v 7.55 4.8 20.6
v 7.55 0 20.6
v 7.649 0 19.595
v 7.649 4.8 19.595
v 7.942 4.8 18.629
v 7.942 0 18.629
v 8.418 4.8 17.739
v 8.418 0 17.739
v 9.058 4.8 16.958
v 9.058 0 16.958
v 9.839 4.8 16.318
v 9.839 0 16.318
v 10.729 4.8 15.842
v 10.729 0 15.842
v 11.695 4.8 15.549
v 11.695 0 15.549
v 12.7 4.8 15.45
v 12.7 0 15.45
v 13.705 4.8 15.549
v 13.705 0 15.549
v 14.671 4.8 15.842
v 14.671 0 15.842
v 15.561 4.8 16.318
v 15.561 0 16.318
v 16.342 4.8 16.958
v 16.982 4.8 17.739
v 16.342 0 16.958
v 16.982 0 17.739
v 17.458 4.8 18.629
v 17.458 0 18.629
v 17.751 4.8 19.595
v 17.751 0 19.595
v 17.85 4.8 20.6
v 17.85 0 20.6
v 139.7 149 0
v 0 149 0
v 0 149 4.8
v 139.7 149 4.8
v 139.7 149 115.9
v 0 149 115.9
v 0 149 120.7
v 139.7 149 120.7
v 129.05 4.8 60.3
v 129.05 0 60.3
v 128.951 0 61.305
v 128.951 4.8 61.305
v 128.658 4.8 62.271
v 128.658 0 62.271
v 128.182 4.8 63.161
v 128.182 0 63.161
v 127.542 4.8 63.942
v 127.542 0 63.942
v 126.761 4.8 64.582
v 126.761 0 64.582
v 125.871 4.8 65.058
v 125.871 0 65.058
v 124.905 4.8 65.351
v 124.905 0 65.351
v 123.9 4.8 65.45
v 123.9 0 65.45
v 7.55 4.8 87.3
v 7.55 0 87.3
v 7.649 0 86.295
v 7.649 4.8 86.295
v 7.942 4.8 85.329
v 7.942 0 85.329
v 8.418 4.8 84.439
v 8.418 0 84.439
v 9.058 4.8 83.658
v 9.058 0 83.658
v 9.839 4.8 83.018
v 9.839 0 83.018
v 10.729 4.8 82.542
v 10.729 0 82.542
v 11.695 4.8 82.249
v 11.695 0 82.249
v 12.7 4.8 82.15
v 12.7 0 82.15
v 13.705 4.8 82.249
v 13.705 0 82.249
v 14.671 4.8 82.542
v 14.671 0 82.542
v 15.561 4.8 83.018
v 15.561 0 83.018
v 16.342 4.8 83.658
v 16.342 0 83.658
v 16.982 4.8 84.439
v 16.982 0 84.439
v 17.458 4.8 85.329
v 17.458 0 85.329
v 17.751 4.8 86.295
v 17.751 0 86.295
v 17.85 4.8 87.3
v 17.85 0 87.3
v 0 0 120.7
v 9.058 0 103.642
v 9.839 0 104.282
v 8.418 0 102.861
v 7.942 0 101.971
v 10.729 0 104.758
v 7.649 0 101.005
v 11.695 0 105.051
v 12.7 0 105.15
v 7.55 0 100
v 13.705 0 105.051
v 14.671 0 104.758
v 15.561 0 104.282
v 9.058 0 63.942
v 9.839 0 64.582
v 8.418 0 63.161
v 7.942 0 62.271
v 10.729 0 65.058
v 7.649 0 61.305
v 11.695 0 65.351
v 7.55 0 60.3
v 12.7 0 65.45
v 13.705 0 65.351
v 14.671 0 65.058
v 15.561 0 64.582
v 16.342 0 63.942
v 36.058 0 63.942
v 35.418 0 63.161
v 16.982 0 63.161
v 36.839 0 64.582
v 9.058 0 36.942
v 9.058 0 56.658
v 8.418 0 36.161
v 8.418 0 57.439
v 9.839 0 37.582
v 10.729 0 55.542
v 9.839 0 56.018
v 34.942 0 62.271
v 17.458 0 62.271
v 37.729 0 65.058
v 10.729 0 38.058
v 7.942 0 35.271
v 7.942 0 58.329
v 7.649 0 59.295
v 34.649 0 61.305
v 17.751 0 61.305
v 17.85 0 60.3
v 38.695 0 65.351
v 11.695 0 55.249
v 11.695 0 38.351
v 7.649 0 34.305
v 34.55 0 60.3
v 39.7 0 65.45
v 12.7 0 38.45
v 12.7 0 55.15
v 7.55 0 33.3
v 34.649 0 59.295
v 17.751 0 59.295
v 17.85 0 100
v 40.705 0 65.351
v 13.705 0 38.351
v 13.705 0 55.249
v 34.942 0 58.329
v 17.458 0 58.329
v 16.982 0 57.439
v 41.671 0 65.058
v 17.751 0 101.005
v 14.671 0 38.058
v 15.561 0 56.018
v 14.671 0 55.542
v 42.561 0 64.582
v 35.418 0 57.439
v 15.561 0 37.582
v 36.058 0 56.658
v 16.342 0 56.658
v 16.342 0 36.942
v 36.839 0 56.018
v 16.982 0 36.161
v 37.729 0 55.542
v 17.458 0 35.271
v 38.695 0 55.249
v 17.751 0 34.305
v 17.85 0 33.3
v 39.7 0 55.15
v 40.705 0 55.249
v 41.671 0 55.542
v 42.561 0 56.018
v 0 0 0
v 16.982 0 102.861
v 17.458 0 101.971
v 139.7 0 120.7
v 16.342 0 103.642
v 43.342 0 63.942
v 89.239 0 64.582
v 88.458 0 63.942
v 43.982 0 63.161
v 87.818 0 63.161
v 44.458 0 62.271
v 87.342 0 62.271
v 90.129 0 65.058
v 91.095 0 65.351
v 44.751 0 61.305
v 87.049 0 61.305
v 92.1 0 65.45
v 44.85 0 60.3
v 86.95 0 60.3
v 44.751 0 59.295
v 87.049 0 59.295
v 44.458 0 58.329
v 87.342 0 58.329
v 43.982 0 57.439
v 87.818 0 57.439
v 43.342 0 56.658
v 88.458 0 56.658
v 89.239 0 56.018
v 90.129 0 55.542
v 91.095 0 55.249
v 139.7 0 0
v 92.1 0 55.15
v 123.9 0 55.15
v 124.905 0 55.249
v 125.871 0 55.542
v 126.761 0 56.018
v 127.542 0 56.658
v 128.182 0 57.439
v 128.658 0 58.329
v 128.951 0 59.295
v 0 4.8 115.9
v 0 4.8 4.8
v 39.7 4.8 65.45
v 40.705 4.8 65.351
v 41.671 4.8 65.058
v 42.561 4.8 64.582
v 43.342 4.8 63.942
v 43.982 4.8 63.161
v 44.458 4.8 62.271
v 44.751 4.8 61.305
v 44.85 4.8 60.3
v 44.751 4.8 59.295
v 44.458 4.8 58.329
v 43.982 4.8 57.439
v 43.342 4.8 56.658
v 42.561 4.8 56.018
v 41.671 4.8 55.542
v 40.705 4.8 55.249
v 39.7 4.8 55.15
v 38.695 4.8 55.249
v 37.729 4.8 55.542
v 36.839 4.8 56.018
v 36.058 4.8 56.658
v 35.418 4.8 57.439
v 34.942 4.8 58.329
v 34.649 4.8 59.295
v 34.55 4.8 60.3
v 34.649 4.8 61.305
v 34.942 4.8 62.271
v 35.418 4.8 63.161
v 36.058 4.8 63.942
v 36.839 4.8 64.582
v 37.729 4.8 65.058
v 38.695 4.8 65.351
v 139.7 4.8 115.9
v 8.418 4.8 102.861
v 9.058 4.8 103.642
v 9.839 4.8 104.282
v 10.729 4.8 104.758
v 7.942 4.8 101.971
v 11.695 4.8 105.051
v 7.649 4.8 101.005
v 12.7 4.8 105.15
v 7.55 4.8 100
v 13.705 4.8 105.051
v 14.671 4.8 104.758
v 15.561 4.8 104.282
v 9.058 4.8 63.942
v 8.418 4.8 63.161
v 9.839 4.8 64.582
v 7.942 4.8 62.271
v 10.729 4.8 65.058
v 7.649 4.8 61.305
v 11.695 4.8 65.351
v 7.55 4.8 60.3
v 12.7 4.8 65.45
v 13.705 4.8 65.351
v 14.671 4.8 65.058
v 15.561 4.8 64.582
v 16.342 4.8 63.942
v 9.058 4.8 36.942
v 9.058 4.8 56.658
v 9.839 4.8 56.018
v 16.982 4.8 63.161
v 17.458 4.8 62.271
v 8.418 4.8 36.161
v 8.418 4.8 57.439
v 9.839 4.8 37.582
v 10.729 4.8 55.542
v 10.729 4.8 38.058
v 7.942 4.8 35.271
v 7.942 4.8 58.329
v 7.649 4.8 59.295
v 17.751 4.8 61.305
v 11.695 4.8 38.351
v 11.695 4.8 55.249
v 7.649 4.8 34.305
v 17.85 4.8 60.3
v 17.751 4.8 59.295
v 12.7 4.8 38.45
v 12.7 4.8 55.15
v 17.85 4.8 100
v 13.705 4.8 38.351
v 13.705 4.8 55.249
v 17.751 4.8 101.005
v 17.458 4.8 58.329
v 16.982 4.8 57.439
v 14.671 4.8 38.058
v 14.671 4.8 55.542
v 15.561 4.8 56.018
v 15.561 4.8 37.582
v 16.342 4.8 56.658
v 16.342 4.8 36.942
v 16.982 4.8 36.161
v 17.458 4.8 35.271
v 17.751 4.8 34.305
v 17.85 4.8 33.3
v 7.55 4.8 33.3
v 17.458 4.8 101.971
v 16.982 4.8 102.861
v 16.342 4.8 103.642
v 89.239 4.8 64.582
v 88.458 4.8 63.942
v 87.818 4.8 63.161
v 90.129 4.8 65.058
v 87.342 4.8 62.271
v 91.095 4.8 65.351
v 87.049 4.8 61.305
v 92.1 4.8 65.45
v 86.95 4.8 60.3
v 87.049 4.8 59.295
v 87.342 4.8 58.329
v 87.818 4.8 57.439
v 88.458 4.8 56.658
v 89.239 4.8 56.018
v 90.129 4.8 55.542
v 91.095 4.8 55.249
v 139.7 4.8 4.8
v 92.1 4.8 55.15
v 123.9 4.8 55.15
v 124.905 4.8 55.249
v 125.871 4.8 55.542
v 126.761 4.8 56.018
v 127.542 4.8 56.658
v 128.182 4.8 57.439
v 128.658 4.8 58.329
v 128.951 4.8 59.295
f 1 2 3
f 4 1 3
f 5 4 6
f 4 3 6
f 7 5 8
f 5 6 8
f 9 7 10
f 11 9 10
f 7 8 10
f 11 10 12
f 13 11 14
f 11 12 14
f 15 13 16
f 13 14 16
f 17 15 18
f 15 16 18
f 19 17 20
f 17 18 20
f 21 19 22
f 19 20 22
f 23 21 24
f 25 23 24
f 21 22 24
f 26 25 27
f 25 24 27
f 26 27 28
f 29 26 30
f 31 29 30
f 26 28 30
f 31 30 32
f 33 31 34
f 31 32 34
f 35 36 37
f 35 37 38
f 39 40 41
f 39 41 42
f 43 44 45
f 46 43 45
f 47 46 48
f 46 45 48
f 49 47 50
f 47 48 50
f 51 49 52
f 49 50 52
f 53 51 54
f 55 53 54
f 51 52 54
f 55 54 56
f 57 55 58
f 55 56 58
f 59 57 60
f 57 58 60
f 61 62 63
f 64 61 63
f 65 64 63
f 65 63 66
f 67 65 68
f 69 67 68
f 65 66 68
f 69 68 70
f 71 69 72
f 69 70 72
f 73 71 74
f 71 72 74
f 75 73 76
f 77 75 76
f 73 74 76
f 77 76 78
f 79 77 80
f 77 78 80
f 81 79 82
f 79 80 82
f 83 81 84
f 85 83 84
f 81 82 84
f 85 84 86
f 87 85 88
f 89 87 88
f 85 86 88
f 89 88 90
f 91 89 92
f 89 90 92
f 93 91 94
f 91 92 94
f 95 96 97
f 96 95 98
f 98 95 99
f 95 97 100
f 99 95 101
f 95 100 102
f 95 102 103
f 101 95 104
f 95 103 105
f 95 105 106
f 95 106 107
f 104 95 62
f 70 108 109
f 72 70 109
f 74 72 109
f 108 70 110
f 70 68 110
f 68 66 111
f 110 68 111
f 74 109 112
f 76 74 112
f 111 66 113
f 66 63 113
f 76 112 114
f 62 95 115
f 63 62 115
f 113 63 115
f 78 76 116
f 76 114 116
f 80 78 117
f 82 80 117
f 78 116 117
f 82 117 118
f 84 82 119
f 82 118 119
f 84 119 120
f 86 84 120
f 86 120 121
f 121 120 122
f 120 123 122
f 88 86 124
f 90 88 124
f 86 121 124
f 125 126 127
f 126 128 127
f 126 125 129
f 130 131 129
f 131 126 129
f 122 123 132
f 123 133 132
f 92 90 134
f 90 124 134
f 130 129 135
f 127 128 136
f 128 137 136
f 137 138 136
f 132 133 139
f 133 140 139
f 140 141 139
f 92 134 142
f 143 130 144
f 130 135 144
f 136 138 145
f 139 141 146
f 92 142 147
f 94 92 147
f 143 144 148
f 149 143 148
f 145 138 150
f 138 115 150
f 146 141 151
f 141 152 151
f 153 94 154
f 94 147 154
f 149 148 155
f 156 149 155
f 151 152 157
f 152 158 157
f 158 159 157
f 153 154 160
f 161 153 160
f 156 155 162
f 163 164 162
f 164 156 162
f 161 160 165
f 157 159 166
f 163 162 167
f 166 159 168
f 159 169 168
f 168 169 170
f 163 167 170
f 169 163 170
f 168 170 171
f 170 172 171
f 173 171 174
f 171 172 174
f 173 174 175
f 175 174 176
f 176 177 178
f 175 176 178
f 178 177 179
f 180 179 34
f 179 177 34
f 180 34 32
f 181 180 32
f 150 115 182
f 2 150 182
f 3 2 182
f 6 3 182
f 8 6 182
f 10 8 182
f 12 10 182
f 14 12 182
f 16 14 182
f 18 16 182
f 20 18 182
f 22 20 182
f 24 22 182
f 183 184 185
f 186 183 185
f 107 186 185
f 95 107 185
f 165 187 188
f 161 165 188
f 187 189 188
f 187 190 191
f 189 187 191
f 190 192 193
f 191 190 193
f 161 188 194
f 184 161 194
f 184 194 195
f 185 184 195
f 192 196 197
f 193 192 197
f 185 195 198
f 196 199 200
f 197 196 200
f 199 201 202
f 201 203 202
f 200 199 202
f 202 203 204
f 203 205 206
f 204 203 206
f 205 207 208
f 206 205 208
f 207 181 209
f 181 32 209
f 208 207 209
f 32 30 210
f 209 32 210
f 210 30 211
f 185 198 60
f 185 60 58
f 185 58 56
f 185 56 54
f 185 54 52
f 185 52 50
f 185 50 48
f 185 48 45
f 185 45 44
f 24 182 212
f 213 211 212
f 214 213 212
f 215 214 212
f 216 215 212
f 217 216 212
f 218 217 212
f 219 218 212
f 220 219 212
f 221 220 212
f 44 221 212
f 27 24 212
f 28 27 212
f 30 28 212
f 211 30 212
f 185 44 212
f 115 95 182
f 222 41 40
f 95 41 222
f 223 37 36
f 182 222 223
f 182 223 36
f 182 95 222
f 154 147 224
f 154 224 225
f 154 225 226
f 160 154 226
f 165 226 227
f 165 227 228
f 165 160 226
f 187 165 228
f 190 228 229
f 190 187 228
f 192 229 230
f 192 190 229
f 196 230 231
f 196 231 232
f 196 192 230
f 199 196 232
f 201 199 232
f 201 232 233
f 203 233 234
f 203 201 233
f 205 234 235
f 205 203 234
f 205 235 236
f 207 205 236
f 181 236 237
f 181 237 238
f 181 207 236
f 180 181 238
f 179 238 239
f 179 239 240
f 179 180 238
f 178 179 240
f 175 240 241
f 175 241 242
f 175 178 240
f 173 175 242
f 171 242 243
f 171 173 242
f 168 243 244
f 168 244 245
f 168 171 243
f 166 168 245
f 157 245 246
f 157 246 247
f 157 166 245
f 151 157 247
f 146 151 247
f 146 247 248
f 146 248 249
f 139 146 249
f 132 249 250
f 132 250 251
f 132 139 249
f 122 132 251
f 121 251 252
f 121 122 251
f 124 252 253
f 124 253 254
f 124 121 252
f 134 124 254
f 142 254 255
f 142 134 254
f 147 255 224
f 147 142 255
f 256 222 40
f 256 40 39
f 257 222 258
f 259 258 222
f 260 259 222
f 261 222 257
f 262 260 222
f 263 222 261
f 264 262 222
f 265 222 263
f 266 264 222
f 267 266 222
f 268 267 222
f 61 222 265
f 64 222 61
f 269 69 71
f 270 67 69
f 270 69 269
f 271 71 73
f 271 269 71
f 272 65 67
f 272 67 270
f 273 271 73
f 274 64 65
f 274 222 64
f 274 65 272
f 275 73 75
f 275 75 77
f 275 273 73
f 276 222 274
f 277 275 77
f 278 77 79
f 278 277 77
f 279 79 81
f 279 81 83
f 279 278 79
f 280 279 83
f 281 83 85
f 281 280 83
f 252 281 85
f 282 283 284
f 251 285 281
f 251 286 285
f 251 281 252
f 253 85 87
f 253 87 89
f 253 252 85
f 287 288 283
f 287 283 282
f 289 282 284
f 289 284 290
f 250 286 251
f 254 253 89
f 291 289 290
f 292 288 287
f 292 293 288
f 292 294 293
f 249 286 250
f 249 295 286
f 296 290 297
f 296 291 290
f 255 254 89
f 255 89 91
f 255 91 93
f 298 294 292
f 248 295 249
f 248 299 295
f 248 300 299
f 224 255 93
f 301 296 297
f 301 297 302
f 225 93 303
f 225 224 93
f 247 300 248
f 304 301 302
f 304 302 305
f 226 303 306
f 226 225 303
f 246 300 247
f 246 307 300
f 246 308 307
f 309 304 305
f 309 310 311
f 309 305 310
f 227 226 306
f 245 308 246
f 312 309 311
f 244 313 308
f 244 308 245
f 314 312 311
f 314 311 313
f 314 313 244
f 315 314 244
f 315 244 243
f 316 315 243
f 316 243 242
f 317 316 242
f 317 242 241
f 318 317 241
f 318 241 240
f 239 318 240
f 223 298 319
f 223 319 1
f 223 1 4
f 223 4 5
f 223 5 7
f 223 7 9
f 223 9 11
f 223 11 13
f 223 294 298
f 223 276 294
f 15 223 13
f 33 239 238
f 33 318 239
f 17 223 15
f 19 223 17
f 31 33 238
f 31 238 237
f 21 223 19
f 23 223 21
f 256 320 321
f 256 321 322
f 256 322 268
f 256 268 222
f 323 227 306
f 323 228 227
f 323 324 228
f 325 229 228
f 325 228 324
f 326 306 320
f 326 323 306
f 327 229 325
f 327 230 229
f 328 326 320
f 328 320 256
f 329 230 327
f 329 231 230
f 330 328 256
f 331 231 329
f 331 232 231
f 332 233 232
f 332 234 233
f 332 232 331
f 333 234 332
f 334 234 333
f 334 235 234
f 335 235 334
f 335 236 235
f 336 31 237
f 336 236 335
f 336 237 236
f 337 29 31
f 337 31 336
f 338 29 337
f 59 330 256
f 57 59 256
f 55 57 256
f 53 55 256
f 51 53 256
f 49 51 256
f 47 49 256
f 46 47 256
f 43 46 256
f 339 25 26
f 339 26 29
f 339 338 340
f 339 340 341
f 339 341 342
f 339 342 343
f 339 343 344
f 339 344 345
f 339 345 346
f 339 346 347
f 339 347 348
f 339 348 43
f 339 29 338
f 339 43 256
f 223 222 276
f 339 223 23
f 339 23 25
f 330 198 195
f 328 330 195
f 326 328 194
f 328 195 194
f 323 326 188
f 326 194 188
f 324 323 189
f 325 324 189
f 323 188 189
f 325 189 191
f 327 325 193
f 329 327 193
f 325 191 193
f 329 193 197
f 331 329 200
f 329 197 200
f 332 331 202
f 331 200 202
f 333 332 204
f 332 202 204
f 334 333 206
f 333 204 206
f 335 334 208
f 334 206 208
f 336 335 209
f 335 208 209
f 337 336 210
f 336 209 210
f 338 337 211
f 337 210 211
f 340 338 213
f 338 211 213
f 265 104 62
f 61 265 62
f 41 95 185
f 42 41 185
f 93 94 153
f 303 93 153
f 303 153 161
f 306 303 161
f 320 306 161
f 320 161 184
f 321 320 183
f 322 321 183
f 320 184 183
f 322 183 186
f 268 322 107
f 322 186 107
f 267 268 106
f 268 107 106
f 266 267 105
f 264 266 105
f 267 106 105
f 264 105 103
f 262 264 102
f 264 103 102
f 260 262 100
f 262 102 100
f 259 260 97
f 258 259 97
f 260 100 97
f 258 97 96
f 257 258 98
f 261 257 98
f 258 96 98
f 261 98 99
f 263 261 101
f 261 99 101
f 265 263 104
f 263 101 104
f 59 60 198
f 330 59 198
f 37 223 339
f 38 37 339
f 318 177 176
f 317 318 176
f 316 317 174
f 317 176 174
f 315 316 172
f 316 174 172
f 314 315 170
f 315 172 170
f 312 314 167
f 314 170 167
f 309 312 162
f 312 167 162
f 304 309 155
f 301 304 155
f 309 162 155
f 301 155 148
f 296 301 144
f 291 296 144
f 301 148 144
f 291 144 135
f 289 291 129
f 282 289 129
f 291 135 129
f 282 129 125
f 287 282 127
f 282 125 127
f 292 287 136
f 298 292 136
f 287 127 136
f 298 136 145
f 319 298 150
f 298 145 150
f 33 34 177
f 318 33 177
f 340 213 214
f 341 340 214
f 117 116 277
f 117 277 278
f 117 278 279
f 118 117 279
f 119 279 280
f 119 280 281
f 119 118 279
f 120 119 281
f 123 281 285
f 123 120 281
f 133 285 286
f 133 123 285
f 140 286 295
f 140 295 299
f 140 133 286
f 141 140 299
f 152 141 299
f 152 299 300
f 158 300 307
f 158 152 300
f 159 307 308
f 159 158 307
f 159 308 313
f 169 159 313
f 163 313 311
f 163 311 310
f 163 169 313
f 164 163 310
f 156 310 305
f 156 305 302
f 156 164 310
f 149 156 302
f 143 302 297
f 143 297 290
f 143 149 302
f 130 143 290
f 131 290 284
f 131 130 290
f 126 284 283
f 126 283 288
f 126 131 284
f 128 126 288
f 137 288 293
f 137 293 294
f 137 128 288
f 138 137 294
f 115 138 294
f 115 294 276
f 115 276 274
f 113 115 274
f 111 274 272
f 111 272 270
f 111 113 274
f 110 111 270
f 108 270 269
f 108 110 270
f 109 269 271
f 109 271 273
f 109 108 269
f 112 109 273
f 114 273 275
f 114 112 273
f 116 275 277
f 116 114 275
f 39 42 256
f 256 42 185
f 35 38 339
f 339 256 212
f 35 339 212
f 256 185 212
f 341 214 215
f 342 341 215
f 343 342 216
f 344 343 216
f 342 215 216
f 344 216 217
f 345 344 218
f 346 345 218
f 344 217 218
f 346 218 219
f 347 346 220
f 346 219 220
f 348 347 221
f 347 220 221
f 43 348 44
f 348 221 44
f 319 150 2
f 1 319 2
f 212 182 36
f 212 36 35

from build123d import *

# Parameters (mm, degrees)
SKETCH1_W           = 139.7
SKETCH1_H           = 111.1
SKETCH1_R           = 5.15
BOSS_EXTRUDE1_DEPTH = 4.8
SKETCH1_4_W         = 139.7
SKETCH1_4_H         = 4.8
BOSS_EXTRUDE2_DEPTH = 149


with BuildPart() as part:
    # Sketch1 → Boss-Extrude1 (new body)
    with BuildSketch(Plane(origin=(0, 0, 0), x_dir=(1, 0, 0), z_dir=(0, 1, 0))):
        with Locations((69.85, -60.35)):
            Rectangle(SKETCH1_W, SKETCH1_H)
        with BuildLine():
            ThreePointArc((7.55, -87.3), (12.7, -82.15), (17.85, -87.3))
            Line((17.85, -87.3), (17.85, -100))
            ThreePointArc((17.85, -100), (12.7, -105.15), (7.55, -100))
            Line((7.55, -100), (7.55, -87.3))
        make_face(mode=Mode.SUBTRACT)
        with Locations((12.7, -60.3)):
            Circle(SKETCH1_R, mode=Mode.SUBTRACT)
        with Locations((39.7, -60.3)):
            Circle(SKETCH1_R, mode=Mode.SUBTRACT)
        with BuildLine():
            Line((7.55, -33.3), (7.55, -20.6))
            ThreePointArc((7.55, -20.6), (12.7, -15.45), (17.85, -20.6))
            Line((17.85, -20.6), (17.85, -33.3))
            ThreePointArc((17.85, -33.3), (12.7, -38.45), (7.55, -33.3))
        make_face(mode=Mode.SUBTRACT)
        with BuildLine():
            ThreePointArc((92.1, -65.45), (86.95, -60.3), (92.1, -55.15))
            Line((92.1, -55.15), (123.9, -55.15))
            ThreePointArc((123.9, -55.15), (127.541599923, -56.658400077), (129.05, -60.3))
            ThreePointArc((129.05, -60.3), (127.541599923, -63.941599923), (123.9, -65.45))
            Line((123.9, -65.45), (92.1, -65.45))
        make_face(mode=Mode.SUBTRACT)
    extrude(amount=BOSS_EXTRUDE1_DEPTH)

    # Sketch1<4> → Boss-Extrude2 (add)
    with BuildSketch(Plane(origin=(0, 0, 0), x_dir=(1, 0, 0), z_dir=(0, 1, 0))):
        with Locations((69.85, -2.4)):
            Rectangle(SKETCH1_4_W, SKETCH1_4_H)
        with Locations((69.85, -118.3)):
            Rectangle(SKETCH1_4_W, SKETCH1_4_H)
    extrude(amount=BOSS_EXTRUDE2_DEPTH)


solid = part.part
